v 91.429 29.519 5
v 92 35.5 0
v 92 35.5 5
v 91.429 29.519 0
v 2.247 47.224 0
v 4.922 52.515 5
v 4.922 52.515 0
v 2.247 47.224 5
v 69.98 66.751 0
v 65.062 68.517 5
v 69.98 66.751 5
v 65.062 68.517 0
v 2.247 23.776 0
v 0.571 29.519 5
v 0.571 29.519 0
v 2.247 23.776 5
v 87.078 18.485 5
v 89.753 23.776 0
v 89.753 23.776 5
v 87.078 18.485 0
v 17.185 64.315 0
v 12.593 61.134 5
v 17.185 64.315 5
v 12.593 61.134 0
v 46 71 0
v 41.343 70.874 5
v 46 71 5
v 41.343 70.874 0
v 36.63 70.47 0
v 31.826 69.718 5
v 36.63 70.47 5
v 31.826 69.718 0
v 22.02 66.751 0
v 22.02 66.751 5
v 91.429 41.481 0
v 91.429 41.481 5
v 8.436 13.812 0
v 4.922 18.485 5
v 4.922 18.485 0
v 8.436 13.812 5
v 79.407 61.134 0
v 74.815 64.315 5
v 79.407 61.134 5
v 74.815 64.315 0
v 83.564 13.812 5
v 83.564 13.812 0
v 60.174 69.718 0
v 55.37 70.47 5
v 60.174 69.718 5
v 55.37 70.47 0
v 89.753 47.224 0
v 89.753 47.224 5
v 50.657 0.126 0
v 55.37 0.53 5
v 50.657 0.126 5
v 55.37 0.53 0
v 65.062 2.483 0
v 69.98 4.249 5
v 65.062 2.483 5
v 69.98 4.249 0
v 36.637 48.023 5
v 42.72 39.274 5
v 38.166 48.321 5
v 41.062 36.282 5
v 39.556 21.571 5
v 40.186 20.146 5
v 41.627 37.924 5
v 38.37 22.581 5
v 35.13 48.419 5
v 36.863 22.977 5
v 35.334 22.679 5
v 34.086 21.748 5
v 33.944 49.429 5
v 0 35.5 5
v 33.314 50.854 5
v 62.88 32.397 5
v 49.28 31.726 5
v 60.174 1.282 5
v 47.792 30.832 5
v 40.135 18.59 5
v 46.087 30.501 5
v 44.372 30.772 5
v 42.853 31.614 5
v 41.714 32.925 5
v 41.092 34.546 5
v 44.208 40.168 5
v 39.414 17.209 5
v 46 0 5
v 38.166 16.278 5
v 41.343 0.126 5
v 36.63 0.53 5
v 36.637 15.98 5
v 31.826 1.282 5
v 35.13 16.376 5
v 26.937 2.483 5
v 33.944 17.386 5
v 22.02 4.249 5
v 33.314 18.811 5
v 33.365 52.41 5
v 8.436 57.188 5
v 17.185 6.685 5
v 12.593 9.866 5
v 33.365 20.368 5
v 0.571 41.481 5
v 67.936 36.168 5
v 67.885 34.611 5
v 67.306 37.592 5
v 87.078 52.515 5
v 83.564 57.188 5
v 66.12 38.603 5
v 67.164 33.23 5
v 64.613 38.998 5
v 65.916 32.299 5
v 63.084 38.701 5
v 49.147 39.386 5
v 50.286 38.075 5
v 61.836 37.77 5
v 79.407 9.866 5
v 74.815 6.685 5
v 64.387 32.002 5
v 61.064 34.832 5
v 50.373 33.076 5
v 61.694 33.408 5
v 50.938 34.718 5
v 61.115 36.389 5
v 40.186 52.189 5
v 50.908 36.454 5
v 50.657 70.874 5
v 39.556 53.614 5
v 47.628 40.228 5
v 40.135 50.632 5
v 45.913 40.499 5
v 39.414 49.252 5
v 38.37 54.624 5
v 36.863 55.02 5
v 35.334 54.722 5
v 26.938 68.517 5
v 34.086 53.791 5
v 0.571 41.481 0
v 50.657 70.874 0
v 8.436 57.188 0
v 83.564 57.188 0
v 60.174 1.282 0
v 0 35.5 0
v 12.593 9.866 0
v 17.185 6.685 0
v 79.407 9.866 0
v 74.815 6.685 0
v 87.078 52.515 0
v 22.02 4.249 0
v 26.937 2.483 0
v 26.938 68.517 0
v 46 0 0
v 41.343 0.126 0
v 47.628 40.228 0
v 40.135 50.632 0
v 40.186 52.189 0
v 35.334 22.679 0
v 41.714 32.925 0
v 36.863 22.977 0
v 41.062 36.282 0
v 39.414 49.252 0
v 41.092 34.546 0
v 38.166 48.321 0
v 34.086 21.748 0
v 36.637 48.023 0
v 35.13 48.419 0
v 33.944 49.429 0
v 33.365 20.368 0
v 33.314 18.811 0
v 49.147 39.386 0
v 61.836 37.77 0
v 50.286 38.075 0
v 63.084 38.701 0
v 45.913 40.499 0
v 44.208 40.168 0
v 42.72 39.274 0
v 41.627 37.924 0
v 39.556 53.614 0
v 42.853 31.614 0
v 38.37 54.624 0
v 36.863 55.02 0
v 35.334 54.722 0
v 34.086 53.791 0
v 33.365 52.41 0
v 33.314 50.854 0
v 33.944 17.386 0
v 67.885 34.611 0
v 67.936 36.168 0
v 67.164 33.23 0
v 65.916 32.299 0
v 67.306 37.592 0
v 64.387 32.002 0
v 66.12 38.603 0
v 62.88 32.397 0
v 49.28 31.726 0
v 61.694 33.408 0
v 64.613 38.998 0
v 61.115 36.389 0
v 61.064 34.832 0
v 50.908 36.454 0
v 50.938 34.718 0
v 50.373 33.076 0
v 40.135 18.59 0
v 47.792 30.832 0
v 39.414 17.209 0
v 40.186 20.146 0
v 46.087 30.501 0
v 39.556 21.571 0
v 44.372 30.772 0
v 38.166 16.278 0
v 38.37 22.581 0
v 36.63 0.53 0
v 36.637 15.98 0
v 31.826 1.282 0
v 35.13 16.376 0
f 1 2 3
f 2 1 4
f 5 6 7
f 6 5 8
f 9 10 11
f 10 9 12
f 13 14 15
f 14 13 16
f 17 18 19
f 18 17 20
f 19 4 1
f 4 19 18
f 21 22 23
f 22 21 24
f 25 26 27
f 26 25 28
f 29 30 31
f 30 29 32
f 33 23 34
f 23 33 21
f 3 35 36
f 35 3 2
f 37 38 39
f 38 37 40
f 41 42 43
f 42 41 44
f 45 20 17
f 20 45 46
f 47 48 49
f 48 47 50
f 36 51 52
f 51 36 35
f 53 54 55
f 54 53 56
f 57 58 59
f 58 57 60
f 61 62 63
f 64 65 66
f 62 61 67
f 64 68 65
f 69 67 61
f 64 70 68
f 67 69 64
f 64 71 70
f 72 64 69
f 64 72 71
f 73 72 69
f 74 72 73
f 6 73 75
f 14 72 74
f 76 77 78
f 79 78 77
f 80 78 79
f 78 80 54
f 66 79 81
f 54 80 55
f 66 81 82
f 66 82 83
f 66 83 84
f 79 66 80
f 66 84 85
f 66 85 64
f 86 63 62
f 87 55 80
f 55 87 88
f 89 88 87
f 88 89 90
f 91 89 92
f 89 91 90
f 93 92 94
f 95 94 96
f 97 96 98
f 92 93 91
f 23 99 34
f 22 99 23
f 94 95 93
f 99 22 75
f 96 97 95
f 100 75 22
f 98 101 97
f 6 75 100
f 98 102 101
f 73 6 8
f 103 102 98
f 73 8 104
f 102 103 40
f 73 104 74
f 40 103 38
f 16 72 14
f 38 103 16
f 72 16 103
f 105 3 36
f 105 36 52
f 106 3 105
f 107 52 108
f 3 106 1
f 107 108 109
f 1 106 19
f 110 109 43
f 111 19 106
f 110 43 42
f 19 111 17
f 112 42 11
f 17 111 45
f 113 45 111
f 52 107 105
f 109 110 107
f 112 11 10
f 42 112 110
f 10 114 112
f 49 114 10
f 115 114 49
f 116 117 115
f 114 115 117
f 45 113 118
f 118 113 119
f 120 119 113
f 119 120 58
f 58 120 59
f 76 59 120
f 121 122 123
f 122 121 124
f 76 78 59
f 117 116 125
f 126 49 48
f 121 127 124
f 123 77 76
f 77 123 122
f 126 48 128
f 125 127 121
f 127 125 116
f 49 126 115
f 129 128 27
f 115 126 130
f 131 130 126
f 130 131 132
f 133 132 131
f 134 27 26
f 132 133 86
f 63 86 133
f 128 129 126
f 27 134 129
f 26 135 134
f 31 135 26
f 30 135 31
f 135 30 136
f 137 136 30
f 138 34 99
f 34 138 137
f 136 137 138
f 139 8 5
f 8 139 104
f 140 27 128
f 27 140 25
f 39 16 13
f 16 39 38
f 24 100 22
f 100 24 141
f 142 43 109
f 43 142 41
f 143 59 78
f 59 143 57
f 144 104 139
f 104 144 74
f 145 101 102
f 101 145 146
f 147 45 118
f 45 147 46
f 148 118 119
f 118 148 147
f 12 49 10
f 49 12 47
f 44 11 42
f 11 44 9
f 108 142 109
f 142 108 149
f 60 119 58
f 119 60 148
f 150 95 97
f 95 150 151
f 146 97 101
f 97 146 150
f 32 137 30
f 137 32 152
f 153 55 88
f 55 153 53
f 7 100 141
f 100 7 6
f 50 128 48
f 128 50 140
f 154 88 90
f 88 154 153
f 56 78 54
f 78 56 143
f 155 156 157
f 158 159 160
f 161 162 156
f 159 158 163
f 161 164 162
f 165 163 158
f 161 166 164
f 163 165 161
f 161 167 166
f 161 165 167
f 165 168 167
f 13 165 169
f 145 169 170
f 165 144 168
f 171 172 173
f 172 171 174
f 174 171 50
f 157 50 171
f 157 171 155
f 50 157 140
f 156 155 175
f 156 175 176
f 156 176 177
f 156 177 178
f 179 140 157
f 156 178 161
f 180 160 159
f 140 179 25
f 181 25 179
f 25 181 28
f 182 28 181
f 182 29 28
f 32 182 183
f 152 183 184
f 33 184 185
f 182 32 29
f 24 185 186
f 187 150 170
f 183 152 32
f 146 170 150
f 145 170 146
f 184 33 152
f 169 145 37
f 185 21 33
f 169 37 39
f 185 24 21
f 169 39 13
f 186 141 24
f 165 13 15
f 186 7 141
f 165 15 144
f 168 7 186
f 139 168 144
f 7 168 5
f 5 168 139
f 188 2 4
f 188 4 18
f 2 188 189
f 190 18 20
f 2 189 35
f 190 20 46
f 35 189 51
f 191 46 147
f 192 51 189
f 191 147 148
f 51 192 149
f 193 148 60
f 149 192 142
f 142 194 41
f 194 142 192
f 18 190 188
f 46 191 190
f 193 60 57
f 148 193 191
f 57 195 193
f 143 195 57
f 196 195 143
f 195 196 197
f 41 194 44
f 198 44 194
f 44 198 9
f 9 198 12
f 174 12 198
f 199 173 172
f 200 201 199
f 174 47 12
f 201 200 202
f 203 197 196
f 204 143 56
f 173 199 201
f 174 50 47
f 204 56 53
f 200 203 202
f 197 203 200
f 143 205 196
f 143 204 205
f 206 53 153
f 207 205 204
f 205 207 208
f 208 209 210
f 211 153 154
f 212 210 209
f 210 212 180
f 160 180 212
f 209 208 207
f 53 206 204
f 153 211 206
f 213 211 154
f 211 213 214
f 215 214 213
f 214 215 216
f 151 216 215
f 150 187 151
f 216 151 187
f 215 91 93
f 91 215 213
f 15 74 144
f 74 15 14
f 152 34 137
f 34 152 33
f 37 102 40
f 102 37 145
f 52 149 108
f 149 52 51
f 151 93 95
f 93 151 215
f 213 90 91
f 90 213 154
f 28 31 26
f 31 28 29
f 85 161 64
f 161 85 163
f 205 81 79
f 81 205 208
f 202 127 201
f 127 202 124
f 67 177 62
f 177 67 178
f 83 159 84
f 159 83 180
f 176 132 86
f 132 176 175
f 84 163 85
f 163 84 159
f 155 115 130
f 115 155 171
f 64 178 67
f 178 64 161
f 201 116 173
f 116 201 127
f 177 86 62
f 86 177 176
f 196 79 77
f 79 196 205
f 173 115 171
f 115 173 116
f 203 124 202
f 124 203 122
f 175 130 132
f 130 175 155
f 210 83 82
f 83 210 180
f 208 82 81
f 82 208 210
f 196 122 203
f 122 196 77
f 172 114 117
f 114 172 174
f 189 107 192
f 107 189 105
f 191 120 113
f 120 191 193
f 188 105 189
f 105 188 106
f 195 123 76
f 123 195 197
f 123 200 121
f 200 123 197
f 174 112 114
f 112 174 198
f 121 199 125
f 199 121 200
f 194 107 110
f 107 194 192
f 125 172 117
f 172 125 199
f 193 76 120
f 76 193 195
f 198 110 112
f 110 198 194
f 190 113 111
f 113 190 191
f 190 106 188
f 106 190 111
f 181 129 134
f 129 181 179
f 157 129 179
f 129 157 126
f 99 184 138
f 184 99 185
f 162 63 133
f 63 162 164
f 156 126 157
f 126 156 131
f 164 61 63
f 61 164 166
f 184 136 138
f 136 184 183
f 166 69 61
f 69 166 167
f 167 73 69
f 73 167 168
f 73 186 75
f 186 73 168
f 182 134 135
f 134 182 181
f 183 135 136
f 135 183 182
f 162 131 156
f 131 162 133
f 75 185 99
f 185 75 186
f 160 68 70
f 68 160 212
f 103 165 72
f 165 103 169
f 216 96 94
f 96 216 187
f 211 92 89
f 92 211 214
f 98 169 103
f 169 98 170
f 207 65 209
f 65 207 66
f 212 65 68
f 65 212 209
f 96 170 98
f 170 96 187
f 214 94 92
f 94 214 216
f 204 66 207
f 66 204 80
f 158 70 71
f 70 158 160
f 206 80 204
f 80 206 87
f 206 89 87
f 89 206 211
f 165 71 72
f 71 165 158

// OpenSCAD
$fn = 32;

// ----------------------------------------------------------------------
// Cam plate: double_lobe cam, base R32
// ----------------------------------------------------------------------

// --- parameters (mm) ---
base_r = 32;              // base circle radius
lobe_h = 14;              // cam lobe rise
bore_r = 5;               // shaft bore radius
plate_t = 5;              // plate thickness, Z (extrusion height)
ring_r = 18.5;            // lightening ring radius
bolt_r = 3.5;             // lightening hole radius

profile = [[92, 35.5], [91.429, 41.481], [89.753, 47.224], [87.078, 52.515], [83.564, 57.188], [79.407, 61.134], [74.815, 64.315], [69.98, 66.751], [65.062, 68.517], [60.174, 69.718], [55.37, 70.47], [50.657, 70.874], [46, 71], [41.343, 70.874], [36.63, 70.47], [31.826, 69.718], [26.938, 68.517], [22.02, 66.751], [17.185, 64.315], [12.593, 61.134], [8.436, 57.188], [4.922, 52.515], [2.247, 47.224], [0.571, 41.481], [0, 35.5], [0.571, 29.519], [2.247, 23.776], [4.922, 18.485], [8.436, 13.812], [12.593, 9.866], [17.185, 6.685], [22.02, 4.249], [26.937, 2.483], [31.826, 1.282], [36.63, 0.53], [41.343, 0.126], [46, 0], [50.657, 0.126], [55.37, 0.53], [60.174, 1.282], [65.062, 2.483], [69.98, 4.249], [74.815, 6.685], [79.407, 9.866], [83.564, 13.812], [87.078, 18.485], [89.753, 23.776], [91.429, 29.519]];  // primary outline, 48 points, counter clockwise
void_1 = [[50.908, 36.454], [50.286, 38.075], [49.147, 39.386], [47.628, 40.228], [45.913, 40.499], [44.208, 40.168], [42.72, 39.274], [41.627, 37.924], [41.062, 36.282], [41.092, 34.546], [41.714, 32.925], [42.853, 31.614], [44.372, 30.772], [46.087, 30.501], [47.792, 30.832], [49.28, 31.726], [50.373, 33.076], [50.938, 34.718]];  // shaft bore, 18 points
void_2 = [[67.936, 36.168], [67.306, 37.592], [66.12, 38.603], [64.613, 38.998], [63.084, 38.701], [61.836, 37.77], [61.115, 36.389], [61.064, 34.832], [61.694, 33.408], [62.88, 32.397], [64.387, 32.002], [65.916, 32.299], [67.164, 33.23], [67.885, 34.611]];  // lightening hole 1, 14 points
void_3 = [[40.186, 52.189], [39.556, 53.614], [38.37, 54.624], [36.863, 55.02], [35.334, 54.722], [34.086, 53.791], [33.365, 52.41], [33.314, 50.854], [33.944, 49.429], [35.13, 48.419], [36.637, 48.023], [38.166, 48.321], [39.414, 49.252], [40.135, 50.632]];  // lightening hole 2, 14 points
void_4 = [[40.186, 20.146], [39.556, 21.571], [38.37, 22.581], [36.863, 22.977], [35.334, 22.679], [34.086, 21.748], [33.365, 20.368], [33.314, 18.811], [33.944, 17.386], [35.13, 16.376], [36.637, 15.98], [38.166, 16.278], [39.414, 17.209], [40.135, 18.59]];  // lightening hole 3, 14 points

// --- the one profile operation ---
difference() {
  linear_extrude(height = plate_t) polygon(points = profile);
  translate([0, 0, -1])
    linear_extrude(height = plate_t + 2) polygon(points = void_1);
  translate([0, 0, -1])
    linear_extrude(height = plate_t + 2) polygon(points = void_2);
  translate([0, 0, -1])
    linear_extrude(height = plate_t + 2) polygon(points = void_3);
  translate([0, 0, -1])
    linear_extrude(height = plate_t + 2) polygon(points = void_4);
}
